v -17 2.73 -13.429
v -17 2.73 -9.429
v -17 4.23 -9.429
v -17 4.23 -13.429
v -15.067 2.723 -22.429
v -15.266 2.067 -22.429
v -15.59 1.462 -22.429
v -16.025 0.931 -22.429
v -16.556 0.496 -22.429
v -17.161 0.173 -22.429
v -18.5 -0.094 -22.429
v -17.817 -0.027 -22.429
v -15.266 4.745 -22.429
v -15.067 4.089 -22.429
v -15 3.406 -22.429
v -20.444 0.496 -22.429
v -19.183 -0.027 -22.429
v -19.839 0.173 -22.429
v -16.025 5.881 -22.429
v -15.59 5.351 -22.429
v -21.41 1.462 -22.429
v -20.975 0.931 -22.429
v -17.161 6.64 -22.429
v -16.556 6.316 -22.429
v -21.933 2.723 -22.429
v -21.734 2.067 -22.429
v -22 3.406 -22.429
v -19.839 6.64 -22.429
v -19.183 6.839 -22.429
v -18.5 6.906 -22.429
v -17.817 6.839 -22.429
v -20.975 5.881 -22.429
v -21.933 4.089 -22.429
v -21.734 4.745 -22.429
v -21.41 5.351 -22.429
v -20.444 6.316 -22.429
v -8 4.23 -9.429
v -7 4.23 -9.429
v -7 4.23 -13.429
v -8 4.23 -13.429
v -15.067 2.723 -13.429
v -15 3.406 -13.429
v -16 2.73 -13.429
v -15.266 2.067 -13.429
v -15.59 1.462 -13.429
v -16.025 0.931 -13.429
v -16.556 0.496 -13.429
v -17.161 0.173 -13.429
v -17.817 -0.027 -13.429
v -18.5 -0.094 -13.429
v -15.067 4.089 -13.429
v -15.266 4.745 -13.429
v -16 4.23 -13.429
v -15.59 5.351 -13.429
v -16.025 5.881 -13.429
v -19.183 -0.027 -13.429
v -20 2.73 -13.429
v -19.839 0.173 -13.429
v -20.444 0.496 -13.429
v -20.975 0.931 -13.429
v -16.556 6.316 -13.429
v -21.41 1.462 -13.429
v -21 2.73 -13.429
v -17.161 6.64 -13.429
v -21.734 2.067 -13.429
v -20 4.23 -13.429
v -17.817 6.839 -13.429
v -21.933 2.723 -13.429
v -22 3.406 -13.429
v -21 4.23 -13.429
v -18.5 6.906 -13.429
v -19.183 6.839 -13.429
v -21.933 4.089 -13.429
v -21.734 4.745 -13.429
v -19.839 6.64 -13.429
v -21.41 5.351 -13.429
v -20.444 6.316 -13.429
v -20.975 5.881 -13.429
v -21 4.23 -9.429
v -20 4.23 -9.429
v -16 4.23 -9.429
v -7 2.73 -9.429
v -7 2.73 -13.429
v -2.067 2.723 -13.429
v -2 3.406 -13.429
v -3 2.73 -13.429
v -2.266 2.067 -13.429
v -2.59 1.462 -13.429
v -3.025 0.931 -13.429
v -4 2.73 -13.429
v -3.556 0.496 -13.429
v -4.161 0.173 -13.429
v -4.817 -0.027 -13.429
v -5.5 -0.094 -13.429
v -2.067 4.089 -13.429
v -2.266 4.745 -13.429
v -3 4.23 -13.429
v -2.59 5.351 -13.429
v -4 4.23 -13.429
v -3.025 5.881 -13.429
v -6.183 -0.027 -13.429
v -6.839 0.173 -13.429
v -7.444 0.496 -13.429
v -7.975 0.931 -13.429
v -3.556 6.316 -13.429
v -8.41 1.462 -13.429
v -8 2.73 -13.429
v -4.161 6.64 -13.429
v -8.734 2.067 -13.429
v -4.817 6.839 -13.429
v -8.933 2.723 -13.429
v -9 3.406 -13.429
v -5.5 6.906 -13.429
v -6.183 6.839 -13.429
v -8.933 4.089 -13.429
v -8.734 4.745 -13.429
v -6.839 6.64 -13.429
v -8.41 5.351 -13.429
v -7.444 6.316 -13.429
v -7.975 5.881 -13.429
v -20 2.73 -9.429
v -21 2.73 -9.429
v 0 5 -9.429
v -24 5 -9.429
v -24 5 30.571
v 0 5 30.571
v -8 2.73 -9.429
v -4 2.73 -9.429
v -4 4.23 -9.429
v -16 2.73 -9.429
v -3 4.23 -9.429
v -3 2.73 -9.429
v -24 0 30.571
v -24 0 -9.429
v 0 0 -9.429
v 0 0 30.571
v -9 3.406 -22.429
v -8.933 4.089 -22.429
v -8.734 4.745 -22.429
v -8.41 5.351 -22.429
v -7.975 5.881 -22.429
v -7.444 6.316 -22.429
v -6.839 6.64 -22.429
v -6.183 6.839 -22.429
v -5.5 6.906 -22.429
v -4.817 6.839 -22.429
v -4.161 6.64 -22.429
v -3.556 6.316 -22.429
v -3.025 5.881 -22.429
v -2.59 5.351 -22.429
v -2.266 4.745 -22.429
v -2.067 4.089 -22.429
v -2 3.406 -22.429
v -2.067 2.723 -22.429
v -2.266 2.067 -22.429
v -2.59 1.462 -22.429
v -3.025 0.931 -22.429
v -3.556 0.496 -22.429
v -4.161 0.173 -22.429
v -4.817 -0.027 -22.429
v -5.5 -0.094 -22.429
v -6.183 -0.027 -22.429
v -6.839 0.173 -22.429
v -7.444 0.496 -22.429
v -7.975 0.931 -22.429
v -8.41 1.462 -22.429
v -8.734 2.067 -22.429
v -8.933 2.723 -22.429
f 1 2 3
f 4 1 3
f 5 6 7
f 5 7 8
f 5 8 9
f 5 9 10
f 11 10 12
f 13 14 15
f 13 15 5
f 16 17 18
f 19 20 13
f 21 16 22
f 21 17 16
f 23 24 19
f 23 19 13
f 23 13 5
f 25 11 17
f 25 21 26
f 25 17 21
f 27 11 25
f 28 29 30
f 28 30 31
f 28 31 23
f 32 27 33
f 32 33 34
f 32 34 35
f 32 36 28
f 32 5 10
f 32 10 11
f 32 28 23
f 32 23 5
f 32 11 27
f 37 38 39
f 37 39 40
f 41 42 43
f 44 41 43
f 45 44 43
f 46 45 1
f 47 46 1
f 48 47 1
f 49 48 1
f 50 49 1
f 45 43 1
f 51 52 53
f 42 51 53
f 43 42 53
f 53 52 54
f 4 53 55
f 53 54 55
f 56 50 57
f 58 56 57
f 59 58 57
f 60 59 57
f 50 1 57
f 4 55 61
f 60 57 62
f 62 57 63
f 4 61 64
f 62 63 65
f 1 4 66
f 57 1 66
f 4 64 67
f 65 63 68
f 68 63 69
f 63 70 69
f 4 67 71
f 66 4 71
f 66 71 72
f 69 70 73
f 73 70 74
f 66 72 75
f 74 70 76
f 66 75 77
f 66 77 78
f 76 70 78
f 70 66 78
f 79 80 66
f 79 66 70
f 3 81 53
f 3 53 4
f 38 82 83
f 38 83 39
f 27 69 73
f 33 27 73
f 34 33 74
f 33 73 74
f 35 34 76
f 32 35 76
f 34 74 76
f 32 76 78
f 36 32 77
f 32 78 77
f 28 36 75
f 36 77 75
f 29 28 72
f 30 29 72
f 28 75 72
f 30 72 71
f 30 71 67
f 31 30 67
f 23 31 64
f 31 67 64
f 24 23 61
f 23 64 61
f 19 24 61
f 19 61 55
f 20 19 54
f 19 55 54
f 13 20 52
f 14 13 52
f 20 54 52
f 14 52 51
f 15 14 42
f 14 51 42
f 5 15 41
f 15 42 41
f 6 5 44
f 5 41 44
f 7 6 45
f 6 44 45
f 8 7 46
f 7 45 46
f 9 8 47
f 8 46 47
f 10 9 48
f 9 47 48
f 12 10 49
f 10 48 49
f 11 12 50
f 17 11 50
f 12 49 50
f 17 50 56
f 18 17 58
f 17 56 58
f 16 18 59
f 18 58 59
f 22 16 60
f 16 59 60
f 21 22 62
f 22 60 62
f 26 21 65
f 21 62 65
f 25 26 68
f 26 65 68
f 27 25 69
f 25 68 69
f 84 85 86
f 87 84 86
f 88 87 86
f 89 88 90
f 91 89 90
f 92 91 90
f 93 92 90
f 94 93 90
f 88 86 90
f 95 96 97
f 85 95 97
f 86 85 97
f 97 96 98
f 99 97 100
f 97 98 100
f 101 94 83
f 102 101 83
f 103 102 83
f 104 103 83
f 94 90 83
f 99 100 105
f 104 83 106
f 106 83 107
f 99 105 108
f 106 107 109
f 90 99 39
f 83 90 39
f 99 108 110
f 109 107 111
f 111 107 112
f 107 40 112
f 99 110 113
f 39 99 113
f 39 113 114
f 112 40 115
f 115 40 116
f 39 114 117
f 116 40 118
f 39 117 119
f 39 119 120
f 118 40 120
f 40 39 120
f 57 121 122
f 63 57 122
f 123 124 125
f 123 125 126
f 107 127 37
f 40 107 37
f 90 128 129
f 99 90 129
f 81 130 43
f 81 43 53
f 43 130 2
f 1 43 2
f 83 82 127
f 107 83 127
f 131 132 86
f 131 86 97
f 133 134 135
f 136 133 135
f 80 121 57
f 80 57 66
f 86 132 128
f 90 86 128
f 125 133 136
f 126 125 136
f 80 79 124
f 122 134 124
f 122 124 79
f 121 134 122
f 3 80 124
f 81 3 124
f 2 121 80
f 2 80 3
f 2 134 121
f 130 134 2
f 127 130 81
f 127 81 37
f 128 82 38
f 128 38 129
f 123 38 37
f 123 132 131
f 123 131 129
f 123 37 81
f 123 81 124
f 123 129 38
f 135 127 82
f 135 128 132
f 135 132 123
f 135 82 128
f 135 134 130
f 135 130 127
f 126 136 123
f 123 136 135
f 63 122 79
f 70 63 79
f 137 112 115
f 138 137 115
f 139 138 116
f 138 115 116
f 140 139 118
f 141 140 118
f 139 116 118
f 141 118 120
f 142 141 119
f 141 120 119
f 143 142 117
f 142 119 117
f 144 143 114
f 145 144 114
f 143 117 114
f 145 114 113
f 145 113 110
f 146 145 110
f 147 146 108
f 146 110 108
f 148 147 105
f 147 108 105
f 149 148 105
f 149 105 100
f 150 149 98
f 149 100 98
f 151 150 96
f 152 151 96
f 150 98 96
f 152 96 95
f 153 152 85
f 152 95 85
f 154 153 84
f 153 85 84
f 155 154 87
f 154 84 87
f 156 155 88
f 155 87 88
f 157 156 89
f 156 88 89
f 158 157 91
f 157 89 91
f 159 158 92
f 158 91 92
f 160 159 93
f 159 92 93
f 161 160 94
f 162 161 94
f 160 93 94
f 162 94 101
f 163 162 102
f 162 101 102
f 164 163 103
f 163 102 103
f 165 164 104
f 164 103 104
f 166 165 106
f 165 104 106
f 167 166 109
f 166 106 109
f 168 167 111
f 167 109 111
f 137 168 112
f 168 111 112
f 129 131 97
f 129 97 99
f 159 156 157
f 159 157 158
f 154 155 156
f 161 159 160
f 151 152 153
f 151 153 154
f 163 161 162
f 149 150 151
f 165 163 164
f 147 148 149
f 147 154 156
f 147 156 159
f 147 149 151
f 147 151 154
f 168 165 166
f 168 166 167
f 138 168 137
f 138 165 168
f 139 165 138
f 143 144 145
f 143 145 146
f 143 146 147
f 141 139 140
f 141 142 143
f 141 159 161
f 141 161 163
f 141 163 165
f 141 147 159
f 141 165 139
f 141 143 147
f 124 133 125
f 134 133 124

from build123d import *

# Parameters (mm, degrees)
SKETCH1_W           = 24
SKETCH1_H           = 40
BOSS_EXTRUDE1_DEPTH = 5
SKETCH2_W           = 1
SKETCH2_H           = 1.5
BOSS_EXTRUDE2_DEPTH = 4
SKETCH4_R           = 3.5
BOSS_EXTRUDE4_DEPTH = 9


with BuildPart() as part:
    # Sketch1 → Boss-Extrude1 (new body)
    with BuildSketch(Plane(origin=(0, 0, 0), x_dir=(1, 0, 0), z_dir=(0, 1, 0))):
        with Locations((-12, -10.571428571)):
            Rectangle(SKETCH1_W, SKETCH1_H)
    extrude(amount=BOSS_EXTRUDE1_DEPTH)

    # Sketch2 → Boss-Extrude2 (add)
    with BuildSketch(Plane(origin=(0, 0, -9.428571429), x_dir=(-1, 0, 0), z_dir=(0, 0, -1))):
        with Locations((3.5, 3.479518838)):
            Rectangle(SKETCH2_W, SKETCH2_H)
        with Locations((7.5, 3.479518838)):
            Rectangle(SKETCH2_W, SKETCH2_H)
        with Locations((16.5, 3.479518838)):
            Rectangle(SKETCH2_W, SKETCH2_H)
        with Locations((20.5, 3.479518838)):
            Rectangle(SKETCH2_W, SKETCH2_H)
    extrude(amount=BOSS_EXTRUDE2_DEPTH)

    # Sketch4 → Boss-Extrude4 (add)
    with BuildSketch(Plane(origin=(0, 0, -13.428571429), x_dir=(-1, 0, 0), z_dir=(0, 0, -1))):
        with Locations((5.5, 3.40608753)):
            Circle(SKETCH4_R)
        with Locations((18.5, 3.40608753)):
            Circle(SKETCH4_R)
    extrude(amount=BOSS_EXTRUDE4_DEPTH)


solid = part.part
